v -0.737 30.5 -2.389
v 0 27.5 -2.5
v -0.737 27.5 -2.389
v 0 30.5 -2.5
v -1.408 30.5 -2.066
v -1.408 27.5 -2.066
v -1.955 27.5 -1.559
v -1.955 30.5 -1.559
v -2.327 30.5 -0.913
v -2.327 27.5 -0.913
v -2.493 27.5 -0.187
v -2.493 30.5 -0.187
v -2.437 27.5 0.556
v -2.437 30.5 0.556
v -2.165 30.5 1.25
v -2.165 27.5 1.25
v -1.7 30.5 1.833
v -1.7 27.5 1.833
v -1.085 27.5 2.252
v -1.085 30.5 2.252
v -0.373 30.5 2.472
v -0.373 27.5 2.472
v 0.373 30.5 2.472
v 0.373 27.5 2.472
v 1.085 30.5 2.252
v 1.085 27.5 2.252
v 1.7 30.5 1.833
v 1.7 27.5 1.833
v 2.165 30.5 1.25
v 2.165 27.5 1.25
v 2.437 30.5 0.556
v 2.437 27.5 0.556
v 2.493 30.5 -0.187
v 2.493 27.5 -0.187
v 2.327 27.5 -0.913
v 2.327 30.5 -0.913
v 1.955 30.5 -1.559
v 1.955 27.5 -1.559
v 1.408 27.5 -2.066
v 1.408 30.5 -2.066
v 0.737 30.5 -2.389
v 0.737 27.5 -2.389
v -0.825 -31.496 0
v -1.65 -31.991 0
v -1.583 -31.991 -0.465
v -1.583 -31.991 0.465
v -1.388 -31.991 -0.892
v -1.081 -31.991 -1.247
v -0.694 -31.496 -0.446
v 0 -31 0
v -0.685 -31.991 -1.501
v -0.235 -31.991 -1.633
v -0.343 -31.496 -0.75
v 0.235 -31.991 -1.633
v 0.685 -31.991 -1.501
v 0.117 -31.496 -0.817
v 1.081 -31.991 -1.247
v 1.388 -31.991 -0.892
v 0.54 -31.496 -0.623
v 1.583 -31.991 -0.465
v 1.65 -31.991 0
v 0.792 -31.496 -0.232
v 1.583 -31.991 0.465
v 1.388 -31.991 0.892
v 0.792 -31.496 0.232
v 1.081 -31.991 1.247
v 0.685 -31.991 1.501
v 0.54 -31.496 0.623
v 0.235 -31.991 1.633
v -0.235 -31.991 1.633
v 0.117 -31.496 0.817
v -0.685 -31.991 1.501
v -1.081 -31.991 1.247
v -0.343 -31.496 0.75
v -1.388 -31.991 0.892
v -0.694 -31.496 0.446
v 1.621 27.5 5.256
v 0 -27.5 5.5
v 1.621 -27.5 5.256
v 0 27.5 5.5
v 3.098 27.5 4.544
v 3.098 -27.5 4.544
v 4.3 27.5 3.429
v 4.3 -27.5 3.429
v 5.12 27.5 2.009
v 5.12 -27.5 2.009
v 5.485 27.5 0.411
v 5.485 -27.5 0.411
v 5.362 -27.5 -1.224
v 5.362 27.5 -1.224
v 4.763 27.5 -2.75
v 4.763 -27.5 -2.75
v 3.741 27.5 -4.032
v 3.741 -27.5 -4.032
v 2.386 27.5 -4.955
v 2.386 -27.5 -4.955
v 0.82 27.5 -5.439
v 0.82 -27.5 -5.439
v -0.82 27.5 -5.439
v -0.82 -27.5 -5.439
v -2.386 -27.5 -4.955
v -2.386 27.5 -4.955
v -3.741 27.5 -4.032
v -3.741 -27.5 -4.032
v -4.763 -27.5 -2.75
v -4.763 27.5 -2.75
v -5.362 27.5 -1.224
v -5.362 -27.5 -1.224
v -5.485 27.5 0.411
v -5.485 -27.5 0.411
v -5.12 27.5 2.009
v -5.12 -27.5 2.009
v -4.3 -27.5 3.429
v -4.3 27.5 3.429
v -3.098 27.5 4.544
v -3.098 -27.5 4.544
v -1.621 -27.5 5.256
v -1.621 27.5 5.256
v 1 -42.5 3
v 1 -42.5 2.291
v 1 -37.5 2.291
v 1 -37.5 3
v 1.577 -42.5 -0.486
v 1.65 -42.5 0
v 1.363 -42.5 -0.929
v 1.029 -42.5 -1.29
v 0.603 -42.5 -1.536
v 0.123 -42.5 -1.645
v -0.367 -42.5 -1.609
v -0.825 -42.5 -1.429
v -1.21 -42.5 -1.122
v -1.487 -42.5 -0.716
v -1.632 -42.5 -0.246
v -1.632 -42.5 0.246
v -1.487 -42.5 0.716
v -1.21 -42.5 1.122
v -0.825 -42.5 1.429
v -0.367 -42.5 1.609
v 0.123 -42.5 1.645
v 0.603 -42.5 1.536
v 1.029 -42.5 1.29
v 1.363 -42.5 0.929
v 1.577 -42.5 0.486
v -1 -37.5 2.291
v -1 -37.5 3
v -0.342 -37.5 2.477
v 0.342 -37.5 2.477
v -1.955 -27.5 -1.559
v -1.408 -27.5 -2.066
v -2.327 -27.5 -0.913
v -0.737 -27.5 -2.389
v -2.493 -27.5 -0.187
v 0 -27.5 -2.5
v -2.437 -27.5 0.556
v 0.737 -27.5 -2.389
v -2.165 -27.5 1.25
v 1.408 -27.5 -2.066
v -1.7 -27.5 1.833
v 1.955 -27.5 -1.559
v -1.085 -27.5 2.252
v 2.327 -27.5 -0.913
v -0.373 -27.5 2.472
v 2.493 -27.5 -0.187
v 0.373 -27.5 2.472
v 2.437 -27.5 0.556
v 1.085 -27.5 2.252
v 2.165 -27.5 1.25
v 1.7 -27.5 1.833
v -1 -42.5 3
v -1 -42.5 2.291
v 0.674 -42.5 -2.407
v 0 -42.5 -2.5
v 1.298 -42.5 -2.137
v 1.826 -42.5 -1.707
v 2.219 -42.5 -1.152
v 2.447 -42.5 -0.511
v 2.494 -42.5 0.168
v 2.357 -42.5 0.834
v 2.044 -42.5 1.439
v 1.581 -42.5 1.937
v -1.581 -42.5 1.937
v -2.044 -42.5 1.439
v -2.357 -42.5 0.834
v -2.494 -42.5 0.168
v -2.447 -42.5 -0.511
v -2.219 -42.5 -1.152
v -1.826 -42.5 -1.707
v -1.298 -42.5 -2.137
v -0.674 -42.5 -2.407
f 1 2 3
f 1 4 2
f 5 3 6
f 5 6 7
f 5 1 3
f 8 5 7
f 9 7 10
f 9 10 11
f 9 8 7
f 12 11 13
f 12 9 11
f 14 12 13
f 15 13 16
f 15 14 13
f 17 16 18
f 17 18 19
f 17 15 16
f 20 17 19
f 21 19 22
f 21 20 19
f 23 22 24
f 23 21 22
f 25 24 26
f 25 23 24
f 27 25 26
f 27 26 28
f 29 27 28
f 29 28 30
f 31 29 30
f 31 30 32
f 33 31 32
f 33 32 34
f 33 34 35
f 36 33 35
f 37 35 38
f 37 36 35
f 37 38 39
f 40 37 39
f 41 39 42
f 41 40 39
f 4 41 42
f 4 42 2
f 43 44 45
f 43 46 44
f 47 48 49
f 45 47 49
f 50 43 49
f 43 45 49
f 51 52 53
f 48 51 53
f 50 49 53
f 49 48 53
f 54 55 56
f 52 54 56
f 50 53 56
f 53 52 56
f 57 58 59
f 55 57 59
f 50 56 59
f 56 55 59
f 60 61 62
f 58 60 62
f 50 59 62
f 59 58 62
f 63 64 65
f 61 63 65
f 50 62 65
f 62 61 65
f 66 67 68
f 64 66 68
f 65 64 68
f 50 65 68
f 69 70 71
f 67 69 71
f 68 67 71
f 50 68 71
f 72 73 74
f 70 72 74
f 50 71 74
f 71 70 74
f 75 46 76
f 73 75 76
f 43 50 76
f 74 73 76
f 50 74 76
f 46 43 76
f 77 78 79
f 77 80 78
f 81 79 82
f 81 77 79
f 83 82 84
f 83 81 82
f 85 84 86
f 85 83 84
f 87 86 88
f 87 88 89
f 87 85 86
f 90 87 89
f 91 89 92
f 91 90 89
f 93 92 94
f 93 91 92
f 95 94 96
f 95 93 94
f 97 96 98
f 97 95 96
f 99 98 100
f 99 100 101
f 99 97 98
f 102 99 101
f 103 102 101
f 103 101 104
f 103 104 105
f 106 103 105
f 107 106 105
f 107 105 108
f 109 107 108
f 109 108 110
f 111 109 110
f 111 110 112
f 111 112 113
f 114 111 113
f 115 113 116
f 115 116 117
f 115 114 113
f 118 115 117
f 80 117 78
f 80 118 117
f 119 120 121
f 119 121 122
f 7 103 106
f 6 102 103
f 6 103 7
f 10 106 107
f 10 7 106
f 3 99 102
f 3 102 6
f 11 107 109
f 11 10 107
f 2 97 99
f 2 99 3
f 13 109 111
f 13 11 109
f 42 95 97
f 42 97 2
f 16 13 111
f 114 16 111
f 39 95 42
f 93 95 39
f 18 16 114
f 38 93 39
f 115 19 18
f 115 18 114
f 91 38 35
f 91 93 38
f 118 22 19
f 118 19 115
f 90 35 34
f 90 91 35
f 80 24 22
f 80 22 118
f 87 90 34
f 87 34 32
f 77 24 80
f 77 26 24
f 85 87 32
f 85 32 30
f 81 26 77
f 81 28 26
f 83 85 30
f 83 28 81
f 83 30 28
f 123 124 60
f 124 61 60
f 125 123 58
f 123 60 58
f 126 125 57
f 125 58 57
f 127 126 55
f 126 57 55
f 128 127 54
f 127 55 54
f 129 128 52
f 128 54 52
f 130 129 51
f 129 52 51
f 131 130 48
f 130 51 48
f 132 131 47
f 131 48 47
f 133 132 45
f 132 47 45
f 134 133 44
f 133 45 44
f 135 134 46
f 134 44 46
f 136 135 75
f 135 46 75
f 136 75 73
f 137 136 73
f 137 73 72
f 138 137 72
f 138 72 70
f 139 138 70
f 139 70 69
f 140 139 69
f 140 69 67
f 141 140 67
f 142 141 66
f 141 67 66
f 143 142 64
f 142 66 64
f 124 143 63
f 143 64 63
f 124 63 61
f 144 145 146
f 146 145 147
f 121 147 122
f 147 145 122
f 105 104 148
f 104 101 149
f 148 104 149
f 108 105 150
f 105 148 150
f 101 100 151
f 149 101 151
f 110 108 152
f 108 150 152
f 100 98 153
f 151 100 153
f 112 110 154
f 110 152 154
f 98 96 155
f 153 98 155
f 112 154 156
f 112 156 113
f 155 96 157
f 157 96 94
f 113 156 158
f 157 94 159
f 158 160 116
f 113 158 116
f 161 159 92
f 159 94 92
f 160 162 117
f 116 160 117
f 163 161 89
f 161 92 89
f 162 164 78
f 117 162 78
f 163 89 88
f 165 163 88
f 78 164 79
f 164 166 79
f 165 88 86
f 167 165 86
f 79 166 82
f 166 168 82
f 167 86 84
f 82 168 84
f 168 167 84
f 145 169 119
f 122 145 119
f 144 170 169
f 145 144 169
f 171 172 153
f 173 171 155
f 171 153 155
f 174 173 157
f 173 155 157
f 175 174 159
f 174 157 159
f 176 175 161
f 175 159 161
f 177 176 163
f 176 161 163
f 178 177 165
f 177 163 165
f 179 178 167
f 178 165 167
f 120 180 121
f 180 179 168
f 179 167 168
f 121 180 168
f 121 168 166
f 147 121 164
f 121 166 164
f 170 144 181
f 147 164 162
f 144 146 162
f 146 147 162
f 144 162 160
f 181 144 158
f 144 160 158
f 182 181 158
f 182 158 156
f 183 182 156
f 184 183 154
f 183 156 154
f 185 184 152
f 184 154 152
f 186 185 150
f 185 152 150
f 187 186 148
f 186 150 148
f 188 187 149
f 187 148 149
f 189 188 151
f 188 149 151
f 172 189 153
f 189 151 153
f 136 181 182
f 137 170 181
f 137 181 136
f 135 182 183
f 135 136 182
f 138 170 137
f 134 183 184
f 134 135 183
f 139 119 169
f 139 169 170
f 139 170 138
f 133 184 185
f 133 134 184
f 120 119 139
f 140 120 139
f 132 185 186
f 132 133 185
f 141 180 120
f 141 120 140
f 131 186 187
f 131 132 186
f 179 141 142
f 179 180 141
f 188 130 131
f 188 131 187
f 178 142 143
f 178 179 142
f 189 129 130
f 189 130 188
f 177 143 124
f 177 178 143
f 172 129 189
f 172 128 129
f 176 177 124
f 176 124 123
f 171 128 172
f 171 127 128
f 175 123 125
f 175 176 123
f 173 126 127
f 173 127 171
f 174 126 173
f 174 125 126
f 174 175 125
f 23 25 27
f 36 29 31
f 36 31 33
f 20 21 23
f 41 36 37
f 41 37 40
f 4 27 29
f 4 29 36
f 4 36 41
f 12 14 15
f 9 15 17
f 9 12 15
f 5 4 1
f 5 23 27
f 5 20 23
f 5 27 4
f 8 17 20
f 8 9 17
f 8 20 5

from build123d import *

# Parameters (mm, degrees)
SKETCH_1_R             = 2.5
EXTRUDE_1_DEPTH        = 30.5
SKETCH_2_R             = 5.5
EXTRUDE_2_DEPTH        = 27.5
SKETCH_3_R             = 2.5
EXTRUDE_3_DEPTH        = 12
SKETCH_4_W             = 2
SKETCH_4_H             = 1
EXTRUDE_4_DEPTH        = 5
HOLE_WIZARD_M4_1_D     = 3.3
HOLE_WIZARD_M4_1_DEPTH = 10.508579979
HOLE_WIZARD_M4_1_TIP   = 0.991420021


with BuildPart() as part:
    # 草图1 → 凸台-拉伸1 (new, symmetric)
    with BuildSketch(Plane(origin=(0, 0, 0), x_dir=(1, 0, 0), z_dir=(0, 1, 0))):
        with Locations(Location((0, 0, 0), (0, 0, 90))):
            Circle(SKETCH_1_R)
    extrude(amount=EXTRUDE_1_DEPTH, both=True)

    # 草图2 → 凸台-拉伸2 (add, symmetric)
    with BuildSketch(Plane(origin=(0, 0, 0), x_dir=(1, 0, 0), z_dir=(0, 1, 0))):
        with Locations(Location((0, 0, 0), (0, 0, 270))):
            Circle(SKETCH_2_R)
    extrude(amount=EXTRUDE_2_DEPTH, both=True)

    # 草图3 → 凸台-拉伸3 (add)
    with BuildSketch(Plane.XZ.offset(30.5)):
        with Locations(Location((0, 0, 0), (0, 0, 270))):
            Circle(SKETCH_3_R)
    extrude(amount=EXTRUDE_3_DEPTH)

    # 草图4 → 凸台-拉伸4 (add)
    with BuildSketch(Plane.XZ.offset(42.5)):
        with Locations((0, 2.5)):
            Rectangle(SKETCH_4_W, SKETCH_4_H)
    extrude(amount=-EXTRUDE_4_DEPTH)

    # M4 螺纹孔1
    with Locations(Plane(origin=(0, -42.5, 0), x_dir=(-1, 0, 0), z_dir=(0, -1, 0))):
        with Locations((0, 0)):
            Hole(HOLE_WIZARD_M4_1_D / 2, depth=HOLE_WIZARD_M4_1_DEPTH)
            with Locations((0, 0, -(HOLE_WIZARD_M4_1_DEPTH + HOLE_WIZARD_M4_1_TIP / 2))):  # 118° drill point
                Cone(0, HOLE_WIZARD_M4_1_D / 2, HOLE_WIZARD_M4_1_TIP, mode=Mode.SUBTRACT)


solid = part.part
